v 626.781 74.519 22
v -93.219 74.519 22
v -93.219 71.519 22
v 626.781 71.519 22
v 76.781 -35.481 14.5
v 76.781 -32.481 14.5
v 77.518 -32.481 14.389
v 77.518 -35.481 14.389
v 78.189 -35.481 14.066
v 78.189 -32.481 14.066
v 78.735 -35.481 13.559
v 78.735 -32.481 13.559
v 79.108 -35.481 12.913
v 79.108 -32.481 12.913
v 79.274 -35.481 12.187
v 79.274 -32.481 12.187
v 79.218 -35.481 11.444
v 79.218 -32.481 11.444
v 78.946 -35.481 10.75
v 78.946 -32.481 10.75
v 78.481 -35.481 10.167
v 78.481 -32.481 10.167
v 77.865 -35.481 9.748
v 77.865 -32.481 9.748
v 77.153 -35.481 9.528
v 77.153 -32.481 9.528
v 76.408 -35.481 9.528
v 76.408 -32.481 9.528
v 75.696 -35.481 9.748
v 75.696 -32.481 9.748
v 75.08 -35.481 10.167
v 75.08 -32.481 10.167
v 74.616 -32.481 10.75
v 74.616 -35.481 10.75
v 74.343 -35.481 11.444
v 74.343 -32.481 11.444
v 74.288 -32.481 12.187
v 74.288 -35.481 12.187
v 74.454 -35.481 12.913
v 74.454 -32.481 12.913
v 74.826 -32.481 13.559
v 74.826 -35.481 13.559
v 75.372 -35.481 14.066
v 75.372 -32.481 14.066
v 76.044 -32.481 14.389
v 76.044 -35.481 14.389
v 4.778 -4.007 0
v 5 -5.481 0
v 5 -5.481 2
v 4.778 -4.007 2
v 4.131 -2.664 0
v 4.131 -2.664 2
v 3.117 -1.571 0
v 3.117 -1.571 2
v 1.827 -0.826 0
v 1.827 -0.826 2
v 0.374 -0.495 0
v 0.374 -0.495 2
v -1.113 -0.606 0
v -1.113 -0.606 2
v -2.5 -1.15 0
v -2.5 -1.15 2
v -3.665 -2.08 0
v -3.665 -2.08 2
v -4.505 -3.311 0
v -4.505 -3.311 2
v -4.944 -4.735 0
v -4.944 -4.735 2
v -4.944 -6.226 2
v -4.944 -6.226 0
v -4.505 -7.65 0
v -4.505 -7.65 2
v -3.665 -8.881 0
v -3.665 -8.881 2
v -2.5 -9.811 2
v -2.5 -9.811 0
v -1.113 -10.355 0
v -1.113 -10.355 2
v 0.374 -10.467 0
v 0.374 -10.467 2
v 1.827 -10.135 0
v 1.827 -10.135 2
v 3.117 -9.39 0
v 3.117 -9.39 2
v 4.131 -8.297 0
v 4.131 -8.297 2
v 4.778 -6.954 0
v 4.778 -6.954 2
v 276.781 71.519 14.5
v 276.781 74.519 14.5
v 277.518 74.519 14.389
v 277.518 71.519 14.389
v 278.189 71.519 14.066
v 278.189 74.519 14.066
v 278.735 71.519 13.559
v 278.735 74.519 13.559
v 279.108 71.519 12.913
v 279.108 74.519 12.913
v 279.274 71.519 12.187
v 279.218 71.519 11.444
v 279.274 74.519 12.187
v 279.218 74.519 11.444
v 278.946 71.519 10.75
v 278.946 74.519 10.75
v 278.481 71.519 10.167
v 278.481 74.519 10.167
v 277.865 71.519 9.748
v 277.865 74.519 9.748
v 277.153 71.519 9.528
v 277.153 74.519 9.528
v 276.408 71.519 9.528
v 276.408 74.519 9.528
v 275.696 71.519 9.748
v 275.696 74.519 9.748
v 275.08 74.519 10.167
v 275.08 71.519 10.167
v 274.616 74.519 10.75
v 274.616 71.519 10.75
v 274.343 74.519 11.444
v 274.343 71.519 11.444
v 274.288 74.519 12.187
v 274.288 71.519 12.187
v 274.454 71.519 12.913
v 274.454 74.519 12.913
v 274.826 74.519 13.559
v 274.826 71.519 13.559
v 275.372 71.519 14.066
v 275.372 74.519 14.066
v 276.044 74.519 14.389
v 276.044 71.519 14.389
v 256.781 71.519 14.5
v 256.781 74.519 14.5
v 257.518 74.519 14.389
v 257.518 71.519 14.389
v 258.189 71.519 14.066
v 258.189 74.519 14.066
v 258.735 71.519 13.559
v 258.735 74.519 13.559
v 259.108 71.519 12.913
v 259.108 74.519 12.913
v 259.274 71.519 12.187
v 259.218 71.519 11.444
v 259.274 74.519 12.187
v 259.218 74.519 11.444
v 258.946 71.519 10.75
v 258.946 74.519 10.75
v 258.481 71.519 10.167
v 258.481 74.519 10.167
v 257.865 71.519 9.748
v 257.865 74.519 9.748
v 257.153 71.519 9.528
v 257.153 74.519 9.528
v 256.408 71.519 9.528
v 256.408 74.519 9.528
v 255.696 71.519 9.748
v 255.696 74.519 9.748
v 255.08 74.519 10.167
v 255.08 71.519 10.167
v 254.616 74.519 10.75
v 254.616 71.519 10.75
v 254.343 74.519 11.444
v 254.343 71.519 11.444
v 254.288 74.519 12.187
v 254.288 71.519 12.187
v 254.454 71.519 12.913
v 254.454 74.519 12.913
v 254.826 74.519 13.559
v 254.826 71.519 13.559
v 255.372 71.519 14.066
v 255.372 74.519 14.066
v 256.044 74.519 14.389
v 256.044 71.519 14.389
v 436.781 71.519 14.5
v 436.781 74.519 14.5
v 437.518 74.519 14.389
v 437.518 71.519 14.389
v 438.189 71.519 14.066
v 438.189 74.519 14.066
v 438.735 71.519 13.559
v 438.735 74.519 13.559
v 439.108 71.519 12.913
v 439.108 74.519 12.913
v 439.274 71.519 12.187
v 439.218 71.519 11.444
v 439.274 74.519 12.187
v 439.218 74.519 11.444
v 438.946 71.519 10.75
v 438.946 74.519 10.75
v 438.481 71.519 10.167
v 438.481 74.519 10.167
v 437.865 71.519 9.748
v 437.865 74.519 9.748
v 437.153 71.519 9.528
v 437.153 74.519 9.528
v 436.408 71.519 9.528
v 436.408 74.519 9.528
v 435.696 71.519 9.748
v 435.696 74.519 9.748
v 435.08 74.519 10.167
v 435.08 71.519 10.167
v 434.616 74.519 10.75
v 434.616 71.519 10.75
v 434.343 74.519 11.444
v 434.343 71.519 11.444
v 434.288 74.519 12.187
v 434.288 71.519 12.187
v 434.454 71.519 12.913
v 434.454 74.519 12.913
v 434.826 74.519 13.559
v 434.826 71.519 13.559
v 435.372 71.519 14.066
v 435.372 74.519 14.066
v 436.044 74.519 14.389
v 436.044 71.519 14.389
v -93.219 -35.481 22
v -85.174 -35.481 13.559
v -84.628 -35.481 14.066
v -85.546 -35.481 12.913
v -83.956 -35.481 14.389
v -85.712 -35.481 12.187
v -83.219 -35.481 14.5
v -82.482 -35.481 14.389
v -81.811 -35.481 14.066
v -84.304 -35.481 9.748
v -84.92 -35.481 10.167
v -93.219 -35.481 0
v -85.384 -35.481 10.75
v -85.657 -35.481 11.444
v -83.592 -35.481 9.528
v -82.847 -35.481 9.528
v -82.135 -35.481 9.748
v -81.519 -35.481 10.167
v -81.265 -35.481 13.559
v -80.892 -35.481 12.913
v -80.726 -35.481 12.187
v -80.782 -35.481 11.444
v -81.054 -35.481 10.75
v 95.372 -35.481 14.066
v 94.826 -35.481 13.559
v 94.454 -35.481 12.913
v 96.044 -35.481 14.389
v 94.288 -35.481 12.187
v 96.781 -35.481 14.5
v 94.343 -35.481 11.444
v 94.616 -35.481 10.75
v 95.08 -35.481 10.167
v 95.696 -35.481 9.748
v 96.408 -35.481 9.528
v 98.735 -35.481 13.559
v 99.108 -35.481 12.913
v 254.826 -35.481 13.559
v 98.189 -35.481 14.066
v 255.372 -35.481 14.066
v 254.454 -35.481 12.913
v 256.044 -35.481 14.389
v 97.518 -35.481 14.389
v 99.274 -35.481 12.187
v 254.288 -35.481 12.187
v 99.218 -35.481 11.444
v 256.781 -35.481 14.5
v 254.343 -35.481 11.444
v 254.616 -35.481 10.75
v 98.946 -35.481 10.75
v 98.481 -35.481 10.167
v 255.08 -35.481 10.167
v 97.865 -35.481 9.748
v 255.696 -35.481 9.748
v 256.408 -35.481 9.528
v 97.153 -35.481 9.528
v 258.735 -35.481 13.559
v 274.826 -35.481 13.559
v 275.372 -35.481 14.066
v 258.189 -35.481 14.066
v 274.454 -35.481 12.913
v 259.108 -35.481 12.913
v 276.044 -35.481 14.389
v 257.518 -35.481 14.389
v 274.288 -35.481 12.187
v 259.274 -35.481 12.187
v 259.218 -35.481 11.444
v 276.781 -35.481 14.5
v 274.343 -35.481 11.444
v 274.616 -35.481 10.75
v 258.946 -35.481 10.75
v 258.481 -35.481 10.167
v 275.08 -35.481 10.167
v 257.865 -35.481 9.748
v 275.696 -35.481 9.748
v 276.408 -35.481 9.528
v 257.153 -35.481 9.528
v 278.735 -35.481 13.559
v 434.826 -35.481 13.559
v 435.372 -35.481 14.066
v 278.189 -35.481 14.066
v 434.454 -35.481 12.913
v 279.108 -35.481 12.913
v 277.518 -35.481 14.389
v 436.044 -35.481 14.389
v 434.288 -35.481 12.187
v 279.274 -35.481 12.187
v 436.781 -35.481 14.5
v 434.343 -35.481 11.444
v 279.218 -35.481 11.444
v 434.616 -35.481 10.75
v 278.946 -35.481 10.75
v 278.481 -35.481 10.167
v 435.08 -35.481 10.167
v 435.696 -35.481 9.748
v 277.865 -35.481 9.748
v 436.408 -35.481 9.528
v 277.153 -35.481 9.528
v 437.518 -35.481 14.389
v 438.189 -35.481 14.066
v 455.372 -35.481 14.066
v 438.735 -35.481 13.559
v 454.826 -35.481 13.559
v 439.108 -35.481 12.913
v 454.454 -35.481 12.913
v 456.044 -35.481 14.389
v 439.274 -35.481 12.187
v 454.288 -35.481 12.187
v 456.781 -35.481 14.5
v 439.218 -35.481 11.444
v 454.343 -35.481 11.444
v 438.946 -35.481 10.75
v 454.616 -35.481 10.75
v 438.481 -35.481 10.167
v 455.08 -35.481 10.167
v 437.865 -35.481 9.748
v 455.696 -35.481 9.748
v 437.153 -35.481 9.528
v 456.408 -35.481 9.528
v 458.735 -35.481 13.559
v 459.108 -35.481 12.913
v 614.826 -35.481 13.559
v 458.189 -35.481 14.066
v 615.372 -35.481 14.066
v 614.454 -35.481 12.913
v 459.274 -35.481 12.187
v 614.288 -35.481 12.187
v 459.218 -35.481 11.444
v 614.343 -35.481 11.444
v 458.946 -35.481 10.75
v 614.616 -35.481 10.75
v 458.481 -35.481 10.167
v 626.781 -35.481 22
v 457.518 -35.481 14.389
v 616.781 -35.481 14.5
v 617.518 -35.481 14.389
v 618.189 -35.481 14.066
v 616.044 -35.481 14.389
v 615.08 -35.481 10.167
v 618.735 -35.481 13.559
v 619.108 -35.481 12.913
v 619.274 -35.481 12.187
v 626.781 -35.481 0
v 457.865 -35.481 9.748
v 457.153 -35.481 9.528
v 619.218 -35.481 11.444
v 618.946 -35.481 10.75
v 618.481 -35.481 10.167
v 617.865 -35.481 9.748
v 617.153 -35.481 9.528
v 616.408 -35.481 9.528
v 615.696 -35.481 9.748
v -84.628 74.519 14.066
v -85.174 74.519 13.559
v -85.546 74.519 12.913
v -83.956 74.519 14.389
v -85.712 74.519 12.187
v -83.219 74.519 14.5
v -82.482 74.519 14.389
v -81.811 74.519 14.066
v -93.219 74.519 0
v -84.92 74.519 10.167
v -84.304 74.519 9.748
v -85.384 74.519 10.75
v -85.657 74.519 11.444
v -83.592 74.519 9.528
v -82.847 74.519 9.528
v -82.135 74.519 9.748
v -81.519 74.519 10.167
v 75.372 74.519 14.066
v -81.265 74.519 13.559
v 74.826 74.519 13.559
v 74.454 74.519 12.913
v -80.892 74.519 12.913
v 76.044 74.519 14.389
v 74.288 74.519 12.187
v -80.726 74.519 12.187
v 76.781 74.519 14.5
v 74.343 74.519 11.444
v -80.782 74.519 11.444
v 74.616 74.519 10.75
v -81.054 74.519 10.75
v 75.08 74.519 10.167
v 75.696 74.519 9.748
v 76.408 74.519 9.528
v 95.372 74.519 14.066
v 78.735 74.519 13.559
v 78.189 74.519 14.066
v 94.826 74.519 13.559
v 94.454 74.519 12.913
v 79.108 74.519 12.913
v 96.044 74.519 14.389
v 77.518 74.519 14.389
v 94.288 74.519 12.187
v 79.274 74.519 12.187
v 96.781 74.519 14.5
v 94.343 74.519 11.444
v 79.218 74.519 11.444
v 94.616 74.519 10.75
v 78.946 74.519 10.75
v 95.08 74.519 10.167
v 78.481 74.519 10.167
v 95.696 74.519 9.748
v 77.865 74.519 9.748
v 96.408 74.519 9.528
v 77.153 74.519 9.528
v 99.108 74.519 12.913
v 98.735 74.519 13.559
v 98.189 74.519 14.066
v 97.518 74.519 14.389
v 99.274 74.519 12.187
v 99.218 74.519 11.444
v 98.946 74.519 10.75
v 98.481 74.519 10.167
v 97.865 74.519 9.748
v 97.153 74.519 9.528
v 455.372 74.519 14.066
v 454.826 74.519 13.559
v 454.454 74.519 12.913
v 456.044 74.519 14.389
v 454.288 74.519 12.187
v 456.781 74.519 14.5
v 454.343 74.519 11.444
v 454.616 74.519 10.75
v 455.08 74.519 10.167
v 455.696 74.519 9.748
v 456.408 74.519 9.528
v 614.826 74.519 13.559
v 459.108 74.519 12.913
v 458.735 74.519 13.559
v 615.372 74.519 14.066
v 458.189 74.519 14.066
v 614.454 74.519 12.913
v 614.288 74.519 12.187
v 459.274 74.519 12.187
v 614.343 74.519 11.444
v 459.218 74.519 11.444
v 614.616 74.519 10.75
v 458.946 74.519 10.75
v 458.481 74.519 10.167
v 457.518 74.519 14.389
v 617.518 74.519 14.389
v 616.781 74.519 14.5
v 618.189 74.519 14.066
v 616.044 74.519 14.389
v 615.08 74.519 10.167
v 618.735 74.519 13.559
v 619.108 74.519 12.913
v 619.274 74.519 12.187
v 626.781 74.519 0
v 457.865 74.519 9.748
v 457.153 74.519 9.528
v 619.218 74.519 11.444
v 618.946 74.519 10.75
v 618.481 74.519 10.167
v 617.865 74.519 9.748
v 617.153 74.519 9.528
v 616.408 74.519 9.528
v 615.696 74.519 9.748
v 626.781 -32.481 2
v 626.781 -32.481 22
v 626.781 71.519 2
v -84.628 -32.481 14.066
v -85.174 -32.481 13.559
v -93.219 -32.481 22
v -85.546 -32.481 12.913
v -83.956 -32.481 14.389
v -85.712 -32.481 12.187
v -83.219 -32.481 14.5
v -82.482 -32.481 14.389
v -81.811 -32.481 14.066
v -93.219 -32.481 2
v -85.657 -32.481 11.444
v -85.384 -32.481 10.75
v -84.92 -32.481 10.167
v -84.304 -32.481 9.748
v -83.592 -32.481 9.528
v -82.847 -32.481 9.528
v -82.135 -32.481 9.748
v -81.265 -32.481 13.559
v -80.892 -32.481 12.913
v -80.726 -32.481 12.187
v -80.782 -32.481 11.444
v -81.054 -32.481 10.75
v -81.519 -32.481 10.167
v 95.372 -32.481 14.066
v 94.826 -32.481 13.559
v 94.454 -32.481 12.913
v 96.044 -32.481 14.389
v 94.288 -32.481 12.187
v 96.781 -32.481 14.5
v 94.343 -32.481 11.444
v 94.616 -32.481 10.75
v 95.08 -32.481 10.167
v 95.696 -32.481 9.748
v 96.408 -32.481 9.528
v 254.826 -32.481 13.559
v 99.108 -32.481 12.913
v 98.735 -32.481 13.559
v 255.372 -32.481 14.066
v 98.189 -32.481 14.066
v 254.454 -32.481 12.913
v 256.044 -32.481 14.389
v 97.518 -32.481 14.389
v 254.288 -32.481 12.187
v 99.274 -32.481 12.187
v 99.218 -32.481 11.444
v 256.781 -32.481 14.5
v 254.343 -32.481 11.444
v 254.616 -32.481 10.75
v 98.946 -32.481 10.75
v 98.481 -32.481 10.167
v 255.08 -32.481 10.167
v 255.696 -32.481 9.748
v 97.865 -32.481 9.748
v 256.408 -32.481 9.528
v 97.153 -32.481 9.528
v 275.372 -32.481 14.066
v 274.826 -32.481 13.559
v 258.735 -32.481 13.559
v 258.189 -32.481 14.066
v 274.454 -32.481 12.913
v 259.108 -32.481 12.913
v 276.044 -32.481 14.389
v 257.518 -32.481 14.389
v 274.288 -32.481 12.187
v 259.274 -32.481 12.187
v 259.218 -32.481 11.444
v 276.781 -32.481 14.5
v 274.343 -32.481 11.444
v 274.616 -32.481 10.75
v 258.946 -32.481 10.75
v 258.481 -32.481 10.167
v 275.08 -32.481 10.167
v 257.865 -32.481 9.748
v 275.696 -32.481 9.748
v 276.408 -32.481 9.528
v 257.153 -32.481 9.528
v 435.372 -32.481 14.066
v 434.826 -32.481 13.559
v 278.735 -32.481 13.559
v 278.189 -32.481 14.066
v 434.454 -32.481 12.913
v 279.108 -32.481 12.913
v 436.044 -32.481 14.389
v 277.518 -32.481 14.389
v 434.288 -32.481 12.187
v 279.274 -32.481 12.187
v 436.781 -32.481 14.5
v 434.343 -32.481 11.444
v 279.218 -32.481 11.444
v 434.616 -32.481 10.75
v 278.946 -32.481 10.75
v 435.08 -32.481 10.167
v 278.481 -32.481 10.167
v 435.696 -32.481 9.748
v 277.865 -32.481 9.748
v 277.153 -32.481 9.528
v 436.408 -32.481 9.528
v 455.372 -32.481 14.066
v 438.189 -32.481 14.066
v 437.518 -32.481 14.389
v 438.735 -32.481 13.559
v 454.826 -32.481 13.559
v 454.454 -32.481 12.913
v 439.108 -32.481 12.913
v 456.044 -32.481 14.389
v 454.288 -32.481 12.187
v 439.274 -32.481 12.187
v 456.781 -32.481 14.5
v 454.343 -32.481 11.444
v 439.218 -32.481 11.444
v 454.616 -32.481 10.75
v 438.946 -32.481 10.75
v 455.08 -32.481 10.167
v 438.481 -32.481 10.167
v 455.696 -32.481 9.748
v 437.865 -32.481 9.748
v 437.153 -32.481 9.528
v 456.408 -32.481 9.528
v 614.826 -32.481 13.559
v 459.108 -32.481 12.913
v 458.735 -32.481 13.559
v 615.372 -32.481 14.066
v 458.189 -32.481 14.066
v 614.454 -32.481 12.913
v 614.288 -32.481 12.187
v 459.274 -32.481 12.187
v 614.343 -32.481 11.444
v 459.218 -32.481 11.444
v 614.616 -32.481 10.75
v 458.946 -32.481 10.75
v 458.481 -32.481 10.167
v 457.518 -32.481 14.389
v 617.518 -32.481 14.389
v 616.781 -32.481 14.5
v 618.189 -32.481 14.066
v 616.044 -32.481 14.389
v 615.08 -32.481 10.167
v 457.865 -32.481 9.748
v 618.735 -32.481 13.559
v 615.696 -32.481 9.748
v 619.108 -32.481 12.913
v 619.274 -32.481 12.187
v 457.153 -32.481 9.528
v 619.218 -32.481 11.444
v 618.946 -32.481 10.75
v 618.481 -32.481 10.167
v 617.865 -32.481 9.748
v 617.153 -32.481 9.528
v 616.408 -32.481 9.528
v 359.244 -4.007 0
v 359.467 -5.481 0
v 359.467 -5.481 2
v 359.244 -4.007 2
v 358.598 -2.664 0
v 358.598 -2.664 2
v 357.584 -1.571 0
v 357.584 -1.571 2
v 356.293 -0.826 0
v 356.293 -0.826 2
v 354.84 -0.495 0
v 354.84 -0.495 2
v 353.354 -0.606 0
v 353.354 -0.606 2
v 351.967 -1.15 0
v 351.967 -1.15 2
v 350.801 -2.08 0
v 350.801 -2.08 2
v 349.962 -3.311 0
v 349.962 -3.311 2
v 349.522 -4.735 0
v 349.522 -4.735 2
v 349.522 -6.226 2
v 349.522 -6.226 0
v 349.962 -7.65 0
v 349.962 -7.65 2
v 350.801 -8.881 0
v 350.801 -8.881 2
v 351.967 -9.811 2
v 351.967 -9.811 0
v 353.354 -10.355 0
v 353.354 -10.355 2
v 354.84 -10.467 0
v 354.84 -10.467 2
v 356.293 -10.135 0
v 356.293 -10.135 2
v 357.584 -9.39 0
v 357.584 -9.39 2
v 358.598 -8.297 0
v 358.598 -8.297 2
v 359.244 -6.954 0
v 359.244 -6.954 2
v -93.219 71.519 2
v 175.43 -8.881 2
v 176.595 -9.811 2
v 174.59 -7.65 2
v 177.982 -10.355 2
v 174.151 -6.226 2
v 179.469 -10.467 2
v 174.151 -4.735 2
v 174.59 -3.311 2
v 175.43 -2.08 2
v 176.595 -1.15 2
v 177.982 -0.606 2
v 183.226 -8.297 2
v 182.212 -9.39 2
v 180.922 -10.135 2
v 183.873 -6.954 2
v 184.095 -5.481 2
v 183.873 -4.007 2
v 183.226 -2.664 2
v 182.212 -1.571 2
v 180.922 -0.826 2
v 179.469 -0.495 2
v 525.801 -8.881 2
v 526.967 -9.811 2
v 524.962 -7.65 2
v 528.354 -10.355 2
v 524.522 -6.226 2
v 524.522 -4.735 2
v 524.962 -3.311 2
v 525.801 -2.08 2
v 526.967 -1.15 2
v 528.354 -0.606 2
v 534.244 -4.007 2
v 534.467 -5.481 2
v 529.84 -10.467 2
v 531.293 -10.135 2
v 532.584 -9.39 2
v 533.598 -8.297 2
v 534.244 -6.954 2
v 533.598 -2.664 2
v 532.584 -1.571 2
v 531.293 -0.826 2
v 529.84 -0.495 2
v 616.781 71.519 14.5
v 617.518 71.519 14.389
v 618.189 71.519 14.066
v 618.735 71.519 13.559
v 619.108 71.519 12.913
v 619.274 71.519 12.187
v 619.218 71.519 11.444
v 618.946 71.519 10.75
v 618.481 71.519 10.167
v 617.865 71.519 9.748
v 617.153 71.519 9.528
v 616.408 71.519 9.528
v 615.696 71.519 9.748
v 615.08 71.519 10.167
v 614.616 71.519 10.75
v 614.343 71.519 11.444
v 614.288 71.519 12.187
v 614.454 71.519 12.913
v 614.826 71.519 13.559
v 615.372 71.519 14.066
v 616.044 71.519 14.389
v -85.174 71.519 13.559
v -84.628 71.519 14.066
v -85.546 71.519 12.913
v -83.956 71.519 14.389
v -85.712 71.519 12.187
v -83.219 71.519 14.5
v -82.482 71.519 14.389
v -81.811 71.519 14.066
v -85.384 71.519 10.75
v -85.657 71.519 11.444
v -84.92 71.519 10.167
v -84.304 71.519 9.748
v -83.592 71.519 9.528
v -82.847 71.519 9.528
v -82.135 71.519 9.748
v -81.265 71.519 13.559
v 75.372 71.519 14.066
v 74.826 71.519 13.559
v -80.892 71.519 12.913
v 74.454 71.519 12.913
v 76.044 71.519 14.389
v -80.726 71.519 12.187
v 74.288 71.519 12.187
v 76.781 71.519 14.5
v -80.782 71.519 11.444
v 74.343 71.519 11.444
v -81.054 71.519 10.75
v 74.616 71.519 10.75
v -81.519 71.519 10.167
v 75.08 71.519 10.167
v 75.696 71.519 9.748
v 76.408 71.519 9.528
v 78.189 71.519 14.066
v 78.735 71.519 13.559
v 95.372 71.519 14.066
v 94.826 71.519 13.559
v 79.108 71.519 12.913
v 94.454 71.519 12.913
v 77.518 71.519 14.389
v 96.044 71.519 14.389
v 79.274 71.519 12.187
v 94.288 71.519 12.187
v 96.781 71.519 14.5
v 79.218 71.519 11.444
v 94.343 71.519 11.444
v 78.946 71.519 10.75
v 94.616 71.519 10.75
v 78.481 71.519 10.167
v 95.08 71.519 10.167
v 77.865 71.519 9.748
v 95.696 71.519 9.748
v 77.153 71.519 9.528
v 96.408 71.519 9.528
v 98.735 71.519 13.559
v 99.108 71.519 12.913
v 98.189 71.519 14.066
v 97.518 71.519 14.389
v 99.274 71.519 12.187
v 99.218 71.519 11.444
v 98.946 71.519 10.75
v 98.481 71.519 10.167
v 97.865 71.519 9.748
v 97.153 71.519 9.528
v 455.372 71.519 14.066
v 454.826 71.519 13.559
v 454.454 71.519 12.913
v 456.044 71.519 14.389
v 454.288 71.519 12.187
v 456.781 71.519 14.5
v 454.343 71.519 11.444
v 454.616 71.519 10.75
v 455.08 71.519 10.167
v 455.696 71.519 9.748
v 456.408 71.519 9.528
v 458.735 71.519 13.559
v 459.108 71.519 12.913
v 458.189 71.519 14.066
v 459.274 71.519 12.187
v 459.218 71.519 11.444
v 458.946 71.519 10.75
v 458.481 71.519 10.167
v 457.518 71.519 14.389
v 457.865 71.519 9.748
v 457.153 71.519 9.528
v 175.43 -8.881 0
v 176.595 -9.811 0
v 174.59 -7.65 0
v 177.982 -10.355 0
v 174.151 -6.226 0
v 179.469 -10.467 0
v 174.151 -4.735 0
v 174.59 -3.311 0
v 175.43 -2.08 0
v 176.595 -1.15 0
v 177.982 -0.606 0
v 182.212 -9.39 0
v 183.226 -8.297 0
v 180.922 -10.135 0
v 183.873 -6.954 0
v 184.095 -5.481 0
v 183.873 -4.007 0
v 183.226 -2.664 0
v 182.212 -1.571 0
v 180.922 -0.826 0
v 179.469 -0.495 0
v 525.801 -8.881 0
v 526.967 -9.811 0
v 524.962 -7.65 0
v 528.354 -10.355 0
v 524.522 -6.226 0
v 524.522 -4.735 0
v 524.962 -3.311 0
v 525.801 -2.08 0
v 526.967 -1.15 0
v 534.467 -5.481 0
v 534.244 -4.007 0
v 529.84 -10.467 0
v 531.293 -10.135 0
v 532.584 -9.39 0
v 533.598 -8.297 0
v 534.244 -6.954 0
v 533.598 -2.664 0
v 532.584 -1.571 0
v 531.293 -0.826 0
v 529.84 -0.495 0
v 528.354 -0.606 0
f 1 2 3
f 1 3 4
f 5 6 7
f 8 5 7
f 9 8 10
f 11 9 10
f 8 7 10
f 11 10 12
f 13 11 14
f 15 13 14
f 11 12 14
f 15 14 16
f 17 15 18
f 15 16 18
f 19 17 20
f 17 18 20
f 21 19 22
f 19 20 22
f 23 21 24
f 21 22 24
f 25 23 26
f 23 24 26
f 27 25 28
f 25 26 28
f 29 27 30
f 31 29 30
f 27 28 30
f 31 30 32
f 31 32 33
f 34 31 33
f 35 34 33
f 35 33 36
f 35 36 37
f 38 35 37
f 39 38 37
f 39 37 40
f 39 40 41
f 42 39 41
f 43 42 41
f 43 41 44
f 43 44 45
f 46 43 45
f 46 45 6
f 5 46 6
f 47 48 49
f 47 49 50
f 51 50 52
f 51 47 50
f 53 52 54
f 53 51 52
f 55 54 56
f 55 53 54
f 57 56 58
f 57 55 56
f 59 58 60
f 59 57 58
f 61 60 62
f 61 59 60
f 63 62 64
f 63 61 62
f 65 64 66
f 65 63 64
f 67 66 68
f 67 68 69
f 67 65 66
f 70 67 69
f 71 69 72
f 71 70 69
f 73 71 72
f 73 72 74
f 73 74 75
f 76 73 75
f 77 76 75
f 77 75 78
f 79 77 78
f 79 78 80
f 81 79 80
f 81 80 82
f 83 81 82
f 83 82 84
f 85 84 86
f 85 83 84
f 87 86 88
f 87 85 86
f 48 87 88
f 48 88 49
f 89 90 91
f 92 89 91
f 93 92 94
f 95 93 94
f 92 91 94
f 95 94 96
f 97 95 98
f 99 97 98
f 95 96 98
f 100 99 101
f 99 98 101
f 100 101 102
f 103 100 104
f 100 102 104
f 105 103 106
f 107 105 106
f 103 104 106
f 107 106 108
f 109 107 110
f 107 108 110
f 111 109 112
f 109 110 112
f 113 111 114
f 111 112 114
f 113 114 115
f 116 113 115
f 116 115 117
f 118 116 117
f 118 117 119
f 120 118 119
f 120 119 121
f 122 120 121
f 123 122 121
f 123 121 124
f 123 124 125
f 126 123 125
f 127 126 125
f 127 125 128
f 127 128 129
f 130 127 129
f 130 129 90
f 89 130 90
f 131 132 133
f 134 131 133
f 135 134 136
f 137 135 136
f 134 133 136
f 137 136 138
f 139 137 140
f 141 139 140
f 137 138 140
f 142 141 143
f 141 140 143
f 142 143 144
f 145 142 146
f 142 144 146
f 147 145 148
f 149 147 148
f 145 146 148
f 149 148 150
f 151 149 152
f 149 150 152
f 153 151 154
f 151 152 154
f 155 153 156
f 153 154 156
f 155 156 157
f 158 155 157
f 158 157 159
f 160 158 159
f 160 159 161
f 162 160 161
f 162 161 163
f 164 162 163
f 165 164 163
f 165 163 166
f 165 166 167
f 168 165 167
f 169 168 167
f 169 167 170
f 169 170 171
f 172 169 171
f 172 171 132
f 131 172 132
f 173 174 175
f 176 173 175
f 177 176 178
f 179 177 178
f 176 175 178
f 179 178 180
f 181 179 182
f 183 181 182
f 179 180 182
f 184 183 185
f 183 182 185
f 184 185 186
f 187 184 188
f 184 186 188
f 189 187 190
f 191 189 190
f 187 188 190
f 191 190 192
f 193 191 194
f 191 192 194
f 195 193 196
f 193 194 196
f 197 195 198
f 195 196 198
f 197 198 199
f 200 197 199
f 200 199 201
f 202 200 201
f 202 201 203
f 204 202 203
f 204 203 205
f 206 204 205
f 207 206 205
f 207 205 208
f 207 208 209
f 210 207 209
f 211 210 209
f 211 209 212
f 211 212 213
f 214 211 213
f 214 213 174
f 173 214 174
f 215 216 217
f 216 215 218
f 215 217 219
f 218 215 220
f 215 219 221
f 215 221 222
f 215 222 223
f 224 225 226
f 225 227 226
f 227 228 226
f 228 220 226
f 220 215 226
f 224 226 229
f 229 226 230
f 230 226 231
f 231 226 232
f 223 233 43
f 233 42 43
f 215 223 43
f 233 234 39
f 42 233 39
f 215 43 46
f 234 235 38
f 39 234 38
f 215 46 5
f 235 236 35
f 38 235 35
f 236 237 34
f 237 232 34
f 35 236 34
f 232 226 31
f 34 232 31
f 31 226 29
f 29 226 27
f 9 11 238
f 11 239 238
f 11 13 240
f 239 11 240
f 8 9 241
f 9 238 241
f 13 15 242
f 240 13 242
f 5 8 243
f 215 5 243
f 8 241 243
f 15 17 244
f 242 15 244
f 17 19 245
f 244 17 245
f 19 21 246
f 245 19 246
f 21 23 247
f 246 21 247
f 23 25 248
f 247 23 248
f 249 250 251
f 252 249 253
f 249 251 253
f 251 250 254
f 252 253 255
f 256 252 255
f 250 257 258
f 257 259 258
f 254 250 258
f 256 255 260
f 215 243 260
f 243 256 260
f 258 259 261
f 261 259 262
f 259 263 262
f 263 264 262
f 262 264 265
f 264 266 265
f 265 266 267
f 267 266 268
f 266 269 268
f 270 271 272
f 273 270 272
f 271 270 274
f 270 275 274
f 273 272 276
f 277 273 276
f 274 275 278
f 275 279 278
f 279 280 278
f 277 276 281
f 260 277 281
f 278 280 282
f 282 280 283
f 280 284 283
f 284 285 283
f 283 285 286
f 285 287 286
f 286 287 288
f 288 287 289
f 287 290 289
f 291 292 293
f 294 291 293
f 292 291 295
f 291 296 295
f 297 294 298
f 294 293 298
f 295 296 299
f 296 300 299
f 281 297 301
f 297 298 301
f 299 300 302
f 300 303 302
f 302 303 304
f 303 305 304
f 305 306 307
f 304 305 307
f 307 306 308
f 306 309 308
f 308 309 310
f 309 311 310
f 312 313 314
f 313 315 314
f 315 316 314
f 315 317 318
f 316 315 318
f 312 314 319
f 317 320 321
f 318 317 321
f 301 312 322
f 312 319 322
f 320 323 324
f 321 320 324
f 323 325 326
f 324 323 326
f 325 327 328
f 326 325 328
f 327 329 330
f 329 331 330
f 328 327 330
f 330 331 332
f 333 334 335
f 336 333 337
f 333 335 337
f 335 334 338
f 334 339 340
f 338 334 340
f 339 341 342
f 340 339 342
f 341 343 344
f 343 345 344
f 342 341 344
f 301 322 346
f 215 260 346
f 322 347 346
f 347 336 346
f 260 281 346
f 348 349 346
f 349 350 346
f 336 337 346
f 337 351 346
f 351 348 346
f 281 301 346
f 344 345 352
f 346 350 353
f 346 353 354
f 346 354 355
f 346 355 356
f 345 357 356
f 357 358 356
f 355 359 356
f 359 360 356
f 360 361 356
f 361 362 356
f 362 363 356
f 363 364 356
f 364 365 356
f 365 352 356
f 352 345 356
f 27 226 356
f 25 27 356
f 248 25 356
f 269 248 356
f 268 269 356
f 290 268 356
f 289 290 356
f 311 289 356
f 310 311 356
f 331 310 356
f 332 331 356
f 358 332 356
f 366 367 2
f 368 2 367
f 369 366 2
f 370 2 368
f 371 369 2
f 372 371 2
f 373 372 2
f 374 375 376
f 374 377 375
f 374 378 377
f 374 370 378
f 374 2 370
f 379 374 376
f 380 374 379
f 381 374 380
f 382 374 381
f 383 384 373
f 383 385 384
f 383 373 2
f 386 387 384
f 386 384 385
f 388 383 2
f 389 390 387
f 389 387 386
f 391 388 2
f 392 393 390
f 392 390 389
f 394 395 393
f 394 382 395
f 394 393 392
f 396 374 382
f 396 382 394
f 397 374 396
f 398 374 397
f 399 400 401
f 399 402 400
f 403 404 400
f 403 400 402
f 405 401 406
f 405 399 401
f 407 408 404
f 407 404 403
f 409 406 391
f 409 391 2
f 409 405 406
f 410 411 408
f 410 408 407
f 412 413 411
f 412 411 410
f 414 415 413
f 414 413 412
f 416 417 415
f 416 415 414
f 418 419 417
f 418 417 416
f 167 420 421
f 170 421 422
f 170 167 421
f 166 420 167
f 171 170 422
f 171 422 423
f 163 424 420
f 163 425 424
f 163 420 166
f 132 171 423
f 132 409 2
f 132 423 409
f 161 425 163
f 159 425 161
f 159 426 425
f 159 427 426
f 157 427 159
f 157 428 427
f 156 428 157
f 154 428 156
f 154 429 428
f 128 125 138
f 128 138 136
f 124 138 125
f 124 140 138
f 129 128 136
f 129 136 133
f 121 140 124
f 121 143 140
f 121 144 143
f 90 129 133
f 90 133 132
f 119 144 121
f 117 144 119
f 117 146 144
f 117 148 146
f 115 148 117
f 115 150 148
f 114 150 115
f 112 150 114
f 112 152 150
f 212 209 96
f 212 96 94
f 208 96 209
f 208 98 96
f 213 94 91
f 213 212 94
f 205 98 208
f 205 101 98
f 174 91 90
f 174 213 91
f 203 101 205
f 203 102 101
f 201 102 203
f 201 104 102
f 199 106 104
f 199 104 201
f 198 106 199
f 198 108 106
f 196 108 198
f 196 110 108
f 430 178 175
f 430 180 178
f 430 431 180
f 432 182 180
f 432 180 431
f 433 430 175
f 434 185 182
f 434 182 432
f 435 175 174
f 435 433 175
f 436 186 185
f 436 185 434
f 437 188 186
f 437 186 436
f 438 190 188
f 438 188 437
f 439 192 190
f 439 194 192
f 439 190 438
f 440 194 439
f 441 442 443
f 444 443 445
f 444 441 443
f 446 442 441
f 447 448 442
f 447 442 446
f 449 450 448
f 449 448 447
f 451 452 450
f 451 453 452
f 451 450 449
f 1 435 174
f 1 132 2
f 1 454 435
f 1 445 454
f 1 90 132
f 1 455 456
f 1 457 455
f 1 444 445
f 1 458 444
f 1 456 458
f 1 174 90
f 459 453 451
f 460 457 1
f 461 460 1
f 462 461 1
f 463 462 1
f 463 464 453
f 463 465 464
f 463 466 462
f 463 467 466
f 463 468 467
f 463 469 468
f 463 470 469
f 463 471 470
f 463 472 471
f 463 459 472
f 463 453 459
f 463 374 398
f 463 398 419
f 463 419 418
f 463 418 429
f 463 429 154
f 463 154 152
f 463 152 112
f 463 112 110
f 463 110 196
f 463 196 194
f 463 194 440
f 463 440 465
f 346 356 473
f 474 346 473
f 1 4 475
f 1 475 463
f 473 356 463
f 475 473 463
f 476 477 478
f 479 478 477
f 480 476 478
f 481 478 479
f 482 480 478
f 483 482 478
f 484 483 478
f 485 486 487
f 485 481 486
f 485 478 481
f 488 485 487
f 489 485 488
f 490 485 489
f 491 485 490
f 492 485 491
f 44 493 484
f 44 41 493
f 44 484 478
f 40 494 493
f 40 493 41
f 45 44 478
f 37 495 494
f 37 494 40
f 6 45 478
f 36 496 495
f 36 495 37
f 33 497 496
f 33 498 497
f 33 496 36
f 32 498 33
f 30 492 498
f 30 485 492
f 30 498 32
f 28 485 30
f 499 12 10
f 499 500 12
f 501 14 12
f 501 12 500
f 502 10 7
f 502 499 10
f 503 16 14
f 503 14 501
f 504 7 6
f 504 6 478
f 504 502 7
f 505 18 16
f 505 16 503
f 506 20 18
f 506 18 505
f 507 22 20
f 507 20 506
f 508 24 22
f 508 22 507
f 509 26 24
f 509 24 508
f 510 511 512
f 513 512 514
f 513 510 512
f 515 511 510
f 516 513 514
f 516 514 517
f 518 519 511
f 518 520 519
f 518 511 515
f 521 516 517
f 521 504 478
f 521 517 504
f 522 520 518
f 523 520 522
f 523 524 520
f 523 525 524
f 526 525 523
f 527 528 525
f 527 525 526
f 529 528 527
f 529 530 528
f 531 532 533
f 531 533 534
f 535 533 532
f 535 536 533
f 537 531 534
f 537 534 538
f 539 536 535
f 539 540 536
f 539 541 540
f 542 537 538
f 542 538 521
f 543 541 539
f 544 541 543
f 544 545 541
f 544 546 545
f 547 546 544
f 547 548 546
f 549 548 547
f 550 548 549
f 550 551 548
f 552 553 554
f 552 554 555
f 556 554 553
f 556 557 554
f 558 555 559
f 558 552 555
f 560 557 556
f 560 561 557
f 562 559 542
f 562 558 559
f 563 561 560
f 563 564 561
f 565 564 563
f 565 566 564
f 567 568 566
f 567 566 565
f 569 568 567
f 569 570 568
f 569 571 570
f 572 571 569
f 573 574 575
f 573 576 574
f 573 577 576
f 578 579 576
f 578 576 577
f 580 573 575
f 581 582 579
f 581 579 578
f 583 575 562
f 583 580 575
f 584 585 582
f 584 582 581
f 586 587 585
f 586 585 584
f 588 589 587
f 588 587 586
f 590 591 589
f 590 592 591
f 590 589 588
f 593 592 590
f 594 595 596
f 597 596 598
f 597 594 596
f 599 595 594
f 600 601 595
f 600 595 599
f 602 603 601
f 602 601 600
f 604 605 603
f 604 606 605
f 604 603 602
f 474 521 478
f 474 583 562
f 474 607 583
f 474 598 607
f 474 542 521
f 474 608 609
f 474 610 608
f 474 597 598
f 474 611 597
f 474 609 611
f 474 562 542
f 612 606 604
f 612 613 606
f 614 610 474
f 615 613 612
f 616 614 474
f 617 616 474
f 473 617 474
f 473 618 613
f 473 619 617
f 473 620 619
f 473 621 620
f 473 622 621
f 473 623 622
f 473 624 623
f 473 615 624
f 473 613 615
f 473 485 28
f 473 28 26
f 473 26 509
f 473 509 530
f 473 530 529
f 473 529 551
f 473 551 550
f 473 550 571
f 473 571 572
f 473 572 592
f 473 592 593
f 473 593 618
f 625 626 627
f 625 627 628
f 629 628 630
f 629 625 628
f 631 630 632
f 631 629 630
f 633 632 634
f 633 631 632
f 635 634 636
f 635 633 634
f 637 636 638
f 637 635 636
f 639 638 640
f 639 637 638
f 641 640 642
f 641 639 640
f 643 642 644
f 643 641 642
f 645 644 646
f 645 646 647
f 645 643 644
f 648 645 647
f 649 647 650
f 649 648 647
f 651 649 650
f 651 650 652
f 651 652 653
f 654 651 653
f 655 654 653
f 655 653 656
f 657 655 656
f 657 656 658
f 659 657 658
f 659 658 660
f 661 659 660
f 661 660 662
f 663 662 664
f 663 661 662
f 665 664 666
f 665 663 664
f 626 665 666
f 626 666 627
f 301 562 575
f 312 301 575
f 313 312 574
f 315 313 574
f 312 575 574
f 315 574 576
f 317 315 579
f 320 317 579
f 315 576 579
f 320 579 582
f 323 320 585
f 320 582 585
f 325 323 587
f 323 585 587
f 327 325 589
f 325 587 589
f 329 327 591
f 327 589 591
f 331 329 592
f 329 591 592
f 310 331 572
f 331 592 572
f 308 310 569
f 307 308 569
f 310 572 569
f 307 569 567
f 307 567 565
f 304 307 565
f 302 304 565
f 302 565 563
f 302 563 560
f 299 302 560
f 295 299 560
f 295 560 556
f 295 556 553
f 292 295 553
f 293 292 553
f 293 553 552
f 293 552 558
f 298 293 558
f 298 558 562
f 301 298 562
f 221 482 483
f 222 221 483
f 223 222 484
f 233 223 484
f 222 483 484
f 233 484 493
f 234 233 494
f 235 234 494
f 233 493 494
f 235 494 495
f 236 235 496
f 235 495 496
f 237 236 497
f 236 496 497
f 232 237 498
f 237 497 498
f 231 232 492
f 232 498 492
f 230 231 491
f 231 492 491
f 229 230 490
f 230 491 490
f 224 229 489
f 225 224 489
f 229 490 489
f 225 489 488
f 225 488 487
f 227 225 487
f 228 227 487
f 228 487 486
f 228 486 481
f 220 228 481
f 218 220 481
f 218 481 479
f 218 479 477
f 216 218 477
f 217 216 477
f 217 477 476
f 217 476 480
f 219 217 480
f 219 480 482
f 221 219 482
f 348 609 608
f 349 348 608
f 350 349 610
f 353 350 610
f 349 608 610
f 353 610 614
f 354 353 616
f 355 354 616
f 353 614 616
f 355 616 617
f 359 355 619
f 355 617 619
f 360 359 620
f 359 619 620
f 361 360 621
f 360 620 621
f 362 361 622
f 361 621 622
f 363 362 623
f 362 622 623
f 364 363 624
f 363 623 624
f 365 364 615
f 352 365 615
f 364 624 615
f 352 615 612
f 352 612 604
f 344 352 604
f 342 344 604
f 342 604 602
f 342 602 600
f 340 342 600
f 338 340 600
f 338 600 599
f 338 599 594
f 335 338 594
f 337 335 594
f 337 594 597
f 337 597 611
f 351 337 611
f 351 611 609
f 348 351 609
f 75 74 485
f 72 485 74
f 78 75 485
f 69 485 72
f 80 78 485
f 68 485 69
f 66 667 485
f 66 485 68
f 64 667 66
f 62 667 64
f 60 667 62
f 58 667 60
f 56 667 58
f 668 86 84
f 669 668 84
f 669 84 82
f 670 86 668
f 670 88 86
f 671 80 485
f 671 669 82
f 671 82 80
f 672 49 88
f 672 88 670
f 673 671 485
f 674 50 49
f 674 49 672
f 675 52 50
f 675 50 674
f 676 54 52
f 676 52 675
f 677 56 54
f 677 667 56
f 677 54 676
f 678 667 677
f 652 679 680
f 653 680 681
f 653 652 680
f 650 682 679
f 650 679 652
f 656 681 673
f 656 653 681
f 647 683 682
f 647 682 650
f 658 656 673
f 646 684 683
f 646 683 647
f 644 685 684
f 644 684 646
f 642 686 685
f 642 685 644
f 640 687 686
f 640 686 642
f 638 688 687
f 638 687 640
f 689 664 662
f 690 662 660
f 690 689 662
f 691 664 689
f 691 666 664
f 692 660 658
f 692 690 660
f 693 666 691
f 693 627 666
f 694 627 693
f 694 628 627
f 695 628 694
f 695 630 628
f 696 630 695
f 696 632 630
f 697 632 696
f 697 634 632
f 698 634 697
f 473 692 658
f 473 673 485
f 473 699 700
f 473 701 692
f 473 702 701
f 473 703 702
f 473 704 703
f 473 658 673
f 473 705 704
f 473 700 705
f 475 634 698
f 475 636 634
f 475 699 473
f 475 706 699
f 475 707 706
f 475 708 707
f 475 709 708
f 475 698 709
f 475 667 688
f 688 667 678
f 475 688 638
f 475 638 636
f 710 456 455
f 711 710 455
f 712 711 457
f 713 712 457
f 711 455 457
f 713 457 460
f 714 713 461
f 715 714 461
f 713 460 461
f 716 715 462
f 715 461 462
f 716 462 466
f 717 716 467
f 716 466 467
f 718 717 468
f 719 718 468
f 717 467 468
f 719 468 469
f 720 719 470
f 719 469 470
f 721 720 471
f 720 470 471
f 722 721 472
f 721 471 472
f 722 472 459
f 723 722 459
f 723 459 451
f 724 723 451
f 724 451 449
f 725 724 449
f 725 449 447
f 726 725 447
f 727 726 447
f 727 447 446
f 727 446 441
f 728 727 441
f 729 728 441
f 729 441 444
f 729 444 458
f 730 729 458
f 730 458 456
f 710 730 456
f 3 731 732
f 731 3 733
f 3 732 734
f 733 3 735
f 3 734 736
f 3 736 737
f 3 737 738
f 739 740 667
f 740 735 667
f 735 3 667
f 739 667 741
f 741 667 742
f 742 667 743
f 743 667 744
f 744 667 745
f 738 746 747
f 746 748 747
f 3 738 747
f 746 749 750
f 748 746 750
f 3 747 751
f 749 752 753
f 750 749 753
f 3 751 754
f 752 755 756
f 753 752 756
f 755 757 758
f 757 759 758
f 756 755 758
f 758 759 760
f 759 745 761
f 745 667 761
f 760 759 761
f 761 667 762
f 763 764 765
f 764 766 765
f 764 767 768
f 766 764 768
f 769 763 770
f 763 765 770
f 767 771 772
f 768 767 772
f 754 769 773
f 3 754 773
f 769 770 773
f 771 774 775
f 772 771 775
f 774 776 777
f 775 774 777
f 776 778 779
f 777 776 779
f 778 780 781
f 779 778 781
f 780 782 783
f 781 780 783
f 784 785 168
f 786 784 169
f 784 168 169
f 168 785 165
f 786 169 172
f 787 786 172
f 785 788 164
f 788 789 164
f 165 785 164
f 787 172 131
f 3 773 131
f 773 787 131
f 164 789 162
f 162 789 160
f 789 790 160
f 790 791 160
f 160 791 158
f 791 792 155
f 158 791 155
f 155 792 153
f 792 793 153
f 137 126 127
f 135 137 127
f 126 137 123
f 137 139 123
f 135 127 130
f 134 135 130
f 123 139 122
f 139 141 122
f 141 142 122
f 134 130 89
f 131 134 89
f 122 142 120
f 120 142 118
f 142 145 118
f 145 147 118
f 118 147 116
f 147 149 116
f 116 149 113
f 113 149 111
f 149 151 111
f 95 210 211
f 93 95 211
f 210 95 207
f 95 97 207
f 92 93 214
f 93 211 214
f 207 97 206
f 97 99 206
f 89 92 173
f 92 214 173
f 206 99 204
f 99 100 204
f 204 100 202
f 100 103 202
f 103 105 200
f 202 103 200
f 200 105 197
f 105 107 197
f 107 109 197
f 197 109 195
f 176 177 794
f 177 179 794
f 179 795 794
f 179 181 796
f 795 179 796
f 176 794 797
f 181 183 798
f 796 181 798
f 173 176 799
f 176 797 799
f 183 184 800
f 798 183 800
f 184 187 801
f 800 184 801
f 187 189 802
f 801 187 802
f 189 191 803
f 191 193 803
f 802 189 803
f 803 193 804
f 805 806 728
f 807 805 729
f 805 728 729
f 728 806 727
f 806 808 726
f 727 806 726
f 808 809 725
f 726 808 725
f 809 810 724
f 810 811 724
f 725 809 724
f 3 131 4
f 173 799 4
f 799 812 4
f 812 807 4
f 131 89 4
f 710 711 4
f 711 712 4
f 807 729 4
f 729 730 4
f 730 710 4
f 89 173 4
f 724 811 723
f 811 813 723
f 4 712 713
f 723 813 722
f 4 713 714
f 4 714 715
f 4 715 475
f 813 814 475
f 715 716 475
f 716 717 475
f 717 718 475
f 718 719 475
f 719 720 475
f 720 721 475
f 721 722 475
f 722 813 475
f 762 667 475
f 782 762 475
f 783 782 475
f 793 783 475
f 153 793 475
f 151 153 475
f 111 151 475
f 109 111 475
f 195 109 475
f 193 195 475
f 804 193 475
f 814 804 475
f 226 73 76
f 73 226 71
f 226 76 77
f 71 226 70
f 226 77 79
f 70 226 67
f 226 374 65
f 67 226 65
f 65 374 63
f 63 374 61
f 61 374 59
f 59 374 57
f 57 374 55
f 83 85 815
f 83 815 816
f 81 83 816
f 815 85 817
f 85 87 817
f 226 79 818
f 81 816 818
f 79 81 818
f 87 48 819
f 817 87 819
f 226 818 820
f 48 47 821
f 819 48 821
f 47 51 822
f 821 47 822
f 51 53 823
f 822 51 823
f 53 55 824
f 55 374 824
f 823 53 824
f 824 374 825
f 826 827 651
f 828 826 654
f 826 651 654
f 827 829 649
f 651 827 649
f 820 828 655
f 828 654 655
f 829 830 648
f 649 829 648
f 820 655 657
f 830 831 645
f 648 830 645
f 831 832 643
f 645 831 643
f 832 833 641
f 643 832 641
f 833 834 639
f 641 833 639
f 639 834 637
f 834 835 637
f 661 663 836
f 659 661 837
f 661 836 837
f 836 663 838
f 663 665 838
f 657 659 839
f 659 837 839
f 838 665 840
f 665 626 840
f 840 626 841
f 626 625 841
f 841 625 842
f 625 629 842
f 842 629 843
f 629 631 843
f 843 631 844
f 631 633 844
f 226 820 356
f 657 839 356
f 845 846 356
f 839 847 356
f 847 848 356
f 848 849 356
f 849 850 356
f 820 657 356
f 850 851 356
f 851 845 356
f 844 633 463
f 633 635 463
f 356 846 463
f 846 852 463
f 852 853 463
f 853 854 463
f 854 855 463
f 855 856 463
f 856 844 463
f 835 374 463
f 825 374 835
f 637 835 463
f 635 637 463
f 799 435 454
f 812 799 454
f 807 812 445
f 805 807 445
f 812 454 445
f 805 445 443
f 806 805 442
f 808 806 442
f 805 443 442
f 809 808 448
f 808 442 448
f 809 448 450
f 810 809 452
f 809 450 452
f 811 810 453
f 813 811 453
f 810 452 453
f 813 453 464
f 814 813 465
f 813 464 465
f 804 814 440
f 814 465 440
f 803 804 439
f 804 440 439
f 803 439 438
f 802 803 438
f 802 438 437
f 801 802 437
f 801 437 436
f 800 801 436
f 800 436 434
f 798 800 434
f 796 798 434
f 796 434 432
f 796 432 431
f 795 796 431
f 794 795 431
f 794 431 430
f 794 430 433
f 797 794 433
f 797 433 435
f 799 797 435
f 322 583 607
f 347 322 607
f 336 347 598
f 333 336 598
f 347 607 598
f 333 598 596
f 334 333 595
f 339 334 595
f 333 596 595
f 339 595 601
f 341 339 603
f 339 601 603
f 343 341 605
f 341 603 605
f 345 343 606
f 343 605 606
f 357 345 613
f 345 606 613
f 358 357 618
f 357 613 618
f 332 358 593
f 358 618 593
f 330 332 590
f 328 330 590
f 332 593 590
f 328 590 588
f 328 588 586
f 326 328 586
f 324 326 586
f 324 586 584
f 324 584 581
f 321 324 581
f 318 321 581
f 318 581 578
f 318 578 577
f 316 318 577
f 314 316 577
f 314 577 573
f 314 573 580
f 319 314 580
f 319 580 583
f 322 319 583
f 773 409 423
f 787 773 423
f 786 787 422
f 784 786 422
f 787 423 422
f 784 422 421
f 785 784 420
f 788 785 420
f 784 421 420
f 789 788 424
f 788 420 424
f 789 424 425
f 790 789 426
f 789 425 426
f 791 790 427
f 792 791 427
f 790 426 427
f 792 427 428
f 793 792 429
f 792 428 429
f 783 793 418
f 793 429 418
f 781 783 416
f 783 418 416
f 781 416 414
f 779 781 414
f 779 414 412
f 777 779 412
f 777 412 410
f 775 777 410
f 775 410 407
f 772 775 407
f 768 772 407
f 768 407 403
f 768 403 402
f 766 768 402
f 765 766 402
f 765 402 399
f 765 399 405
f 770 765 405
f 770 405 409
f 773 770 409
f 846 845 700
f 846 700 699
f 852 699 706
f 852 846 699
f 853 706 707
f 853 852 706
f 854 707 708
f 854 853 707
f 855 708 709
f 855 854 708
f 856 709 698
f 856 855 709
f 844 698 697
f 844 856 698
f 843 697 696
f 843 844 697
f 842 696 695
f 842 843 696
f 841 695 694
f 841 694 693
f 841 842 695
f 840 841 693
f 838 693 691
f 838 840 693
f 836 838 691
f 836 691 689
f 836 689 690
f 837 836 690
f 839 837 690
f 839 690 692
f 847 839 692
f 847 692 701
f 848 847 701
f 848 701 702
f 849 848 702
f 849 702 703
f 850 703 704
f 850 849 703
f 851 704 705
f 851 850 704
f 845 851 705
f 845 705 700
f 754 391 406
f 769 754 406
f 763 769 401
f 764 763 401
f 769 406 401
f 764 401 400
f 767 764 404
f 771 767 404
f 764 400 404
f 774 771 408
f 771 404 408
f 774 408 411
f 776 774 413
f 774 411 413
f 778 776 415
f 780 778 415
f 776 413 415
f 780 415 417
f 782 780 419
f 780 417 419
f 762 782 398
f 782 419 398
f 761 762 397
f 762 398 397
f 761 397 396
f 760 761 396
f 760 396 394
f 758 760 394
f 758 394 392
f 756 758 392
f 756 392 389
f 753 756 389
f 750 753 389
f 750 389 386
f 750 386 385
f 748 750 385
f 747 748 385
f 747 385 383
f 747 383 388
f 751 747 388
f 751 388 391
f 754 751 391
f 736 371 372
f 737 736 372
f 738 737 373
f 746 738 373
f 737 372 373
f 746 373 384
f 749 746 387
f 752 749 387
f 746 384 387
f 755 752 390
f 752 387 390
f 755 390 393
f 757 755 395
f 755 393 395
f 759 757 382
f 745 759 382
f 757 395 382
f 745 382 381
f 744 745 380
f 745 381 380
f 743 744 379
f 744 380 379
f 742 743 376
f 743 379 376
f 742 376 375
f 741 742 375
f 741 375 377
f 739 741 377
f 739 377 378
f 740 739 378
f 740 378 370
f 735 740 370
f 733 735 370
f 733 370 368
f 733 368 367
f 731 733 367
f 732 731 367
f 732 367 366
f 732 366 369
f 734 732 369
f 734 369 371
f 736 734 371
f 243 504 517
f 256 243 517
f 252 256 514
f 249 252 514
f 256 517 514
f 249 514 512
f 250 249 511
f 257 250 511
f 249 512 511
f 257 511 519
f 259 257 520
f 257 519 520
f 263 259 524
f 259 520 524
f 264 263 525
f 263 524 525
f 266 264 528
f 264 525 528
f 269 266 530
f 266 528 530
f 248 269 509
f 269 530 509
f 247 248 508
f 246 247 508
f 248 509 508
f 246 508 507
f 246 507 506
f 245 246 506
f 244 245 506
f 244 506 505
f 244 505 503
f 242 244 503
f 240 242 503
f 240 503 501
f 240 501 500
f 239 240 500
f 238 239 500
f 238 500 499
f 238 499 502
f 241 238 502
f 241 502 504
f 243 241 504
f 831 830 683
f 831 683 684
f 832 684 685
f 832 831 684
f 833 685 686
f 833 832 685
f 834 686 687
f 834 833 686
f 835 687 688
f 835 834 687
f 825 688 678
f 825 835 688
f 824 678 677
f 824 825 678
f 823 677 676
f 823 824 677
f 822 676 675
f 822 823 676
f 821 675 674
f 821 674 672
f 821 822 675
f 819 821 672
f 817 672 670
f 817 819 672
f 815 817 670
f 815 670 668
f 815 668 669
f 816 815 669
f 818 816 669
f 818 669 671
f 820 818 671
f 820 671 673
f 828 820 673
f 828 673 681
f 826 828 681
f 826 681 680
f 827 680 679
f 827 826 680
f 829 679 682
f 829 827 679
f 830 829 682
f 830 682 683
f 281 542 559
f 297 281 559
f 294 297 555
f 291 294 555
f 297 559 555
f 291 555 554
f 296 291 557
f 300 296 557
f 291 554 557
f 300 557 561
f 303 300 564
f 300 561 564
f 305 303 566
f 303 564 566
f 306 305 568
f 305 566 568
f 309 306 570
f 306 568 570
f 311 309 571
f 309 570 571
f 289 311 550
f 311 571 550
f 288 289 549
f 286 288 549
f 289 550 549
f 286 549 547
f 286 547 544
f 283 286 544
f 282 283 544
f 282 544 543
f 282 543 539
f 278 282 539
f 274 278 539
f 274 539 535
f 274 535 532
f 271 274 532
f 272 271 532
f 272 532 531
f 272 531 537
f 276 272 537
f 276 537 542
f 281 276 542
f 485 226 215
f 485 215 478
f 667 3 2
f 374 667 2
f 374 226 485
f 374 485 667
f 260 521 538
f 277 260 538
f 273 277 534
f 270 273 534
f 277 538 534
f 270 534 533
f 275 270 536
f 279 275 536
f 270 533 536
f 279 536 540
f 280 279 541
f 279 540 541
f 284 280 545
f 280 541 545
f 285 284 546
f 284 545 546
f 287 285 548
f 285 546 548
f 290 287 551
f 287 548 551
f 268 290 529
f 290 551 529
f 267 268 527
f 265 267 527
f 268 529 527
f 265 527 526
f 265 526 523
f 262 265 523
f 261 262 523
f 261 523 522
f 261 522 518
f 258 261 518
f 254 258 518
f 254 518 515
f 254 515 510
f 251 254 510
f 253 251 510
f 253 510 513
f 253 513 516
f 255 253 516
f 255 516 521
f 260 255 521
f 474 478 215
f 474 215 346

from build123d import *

# Parameters (mm, degrees)
SKETCH_1_W          = 720
SKETCH_1_H          = 110
SKETCH_1_R          = 5
EXTRUDE_1_DEPTH     = 2
SKETCH_2_W          = 720
SKETCH_2_H          = 3
EXTRUDE_2_DEPTH     = 20
SKETCH_3_R          = 2.5
CUT_EXTRUDE_3_DEPTH = 114


with BuildPart() as part:
    # 草图1 → 凸台-拉伸1 (new body)
    with BuildSketch(Plane.XY):
        with Locations((266.780748393, 19.519407272)):
            Rectangle(SKETCH_1_W, SKETCH_1_H)
        with Locations((0, -5.480592728)):
            Circle(SKETCH_1_R, mode=Mode.SUBTRACT)
        with Locations((179.094970205, -5.480592728)):
            Circle(SKETCH_1_R, mode=Mode.SUBTRACT)
        with Locations((354.466526581, -5.480592728)):
            Circle(SKETCH_1_R, mode=Mode.SUBTRACT)
        with Locations((529.466526581, -5.480592728)):
            Circle(SKETCH_1_R, mode=Mode.SUBTRACT)
    extrude(amount=EXTRUDE_1_DEPTH)

    # 草图2 → 凸台-拉伸2 (add)
    with BuildSketch(Plane.XY.offset(2)):
        with Locations((266.780748393, 73.019407272)):
            Rectangle(SKETCH_2_W, SKETCH_2_H)
        with Locations((266.780748393, -33.980592728)):
            Rectangle(SKETCH_2_W, SKETCH_2_H)
    extrude(amount=EXTRUDE_2_DEPTH)

    # 草图3 → 切除-拉伸3 (cut)
    with BuildSketch(Plane(origin=(0, 74.519407272, 0), x_dir=(1, 0, 0), z_dir=(0, 1, 0))):
        with Locations(Location((456.780748393, -12, 0), (0, 0, 270))):
            Circle(SKETCH_3_R)
        with Locations(Location((616.780748393, -12, 0), (0, 0, 270))):
            Circle(SKETCH_3_R)
        with Locations(Location((436.780748393, -12, 0), (0, 0, 270))):
            Circle(SKETCH_3_R)
        with Locations(Location((276.780748393, -12, 0), (0, 0, 270))):
            Circle(SKETCH_3_R)
        with Locations(Location((256.780748393, -12, 0), (0, 0, 270))):
            Circle(SKETCH_3_R)
        with Locations(Location((96.780748393, -12, 0), (0, 0, 270))):
            Circle(SKETCH_3_R)
        with Locations(Location((76.780748393, -12, 0), (0, 0, 270))):
            Circle(SKETCH_3_R)
        with Locations(Location((-83.219251607, -12, 0), (0, 0, 270))):
            Circle(SKETCH_3_R)
    extrude(amount=-CUT_EXTRUDE_3_DEPTH, mode=Mode.SUBTRACT)


solid = part.part
